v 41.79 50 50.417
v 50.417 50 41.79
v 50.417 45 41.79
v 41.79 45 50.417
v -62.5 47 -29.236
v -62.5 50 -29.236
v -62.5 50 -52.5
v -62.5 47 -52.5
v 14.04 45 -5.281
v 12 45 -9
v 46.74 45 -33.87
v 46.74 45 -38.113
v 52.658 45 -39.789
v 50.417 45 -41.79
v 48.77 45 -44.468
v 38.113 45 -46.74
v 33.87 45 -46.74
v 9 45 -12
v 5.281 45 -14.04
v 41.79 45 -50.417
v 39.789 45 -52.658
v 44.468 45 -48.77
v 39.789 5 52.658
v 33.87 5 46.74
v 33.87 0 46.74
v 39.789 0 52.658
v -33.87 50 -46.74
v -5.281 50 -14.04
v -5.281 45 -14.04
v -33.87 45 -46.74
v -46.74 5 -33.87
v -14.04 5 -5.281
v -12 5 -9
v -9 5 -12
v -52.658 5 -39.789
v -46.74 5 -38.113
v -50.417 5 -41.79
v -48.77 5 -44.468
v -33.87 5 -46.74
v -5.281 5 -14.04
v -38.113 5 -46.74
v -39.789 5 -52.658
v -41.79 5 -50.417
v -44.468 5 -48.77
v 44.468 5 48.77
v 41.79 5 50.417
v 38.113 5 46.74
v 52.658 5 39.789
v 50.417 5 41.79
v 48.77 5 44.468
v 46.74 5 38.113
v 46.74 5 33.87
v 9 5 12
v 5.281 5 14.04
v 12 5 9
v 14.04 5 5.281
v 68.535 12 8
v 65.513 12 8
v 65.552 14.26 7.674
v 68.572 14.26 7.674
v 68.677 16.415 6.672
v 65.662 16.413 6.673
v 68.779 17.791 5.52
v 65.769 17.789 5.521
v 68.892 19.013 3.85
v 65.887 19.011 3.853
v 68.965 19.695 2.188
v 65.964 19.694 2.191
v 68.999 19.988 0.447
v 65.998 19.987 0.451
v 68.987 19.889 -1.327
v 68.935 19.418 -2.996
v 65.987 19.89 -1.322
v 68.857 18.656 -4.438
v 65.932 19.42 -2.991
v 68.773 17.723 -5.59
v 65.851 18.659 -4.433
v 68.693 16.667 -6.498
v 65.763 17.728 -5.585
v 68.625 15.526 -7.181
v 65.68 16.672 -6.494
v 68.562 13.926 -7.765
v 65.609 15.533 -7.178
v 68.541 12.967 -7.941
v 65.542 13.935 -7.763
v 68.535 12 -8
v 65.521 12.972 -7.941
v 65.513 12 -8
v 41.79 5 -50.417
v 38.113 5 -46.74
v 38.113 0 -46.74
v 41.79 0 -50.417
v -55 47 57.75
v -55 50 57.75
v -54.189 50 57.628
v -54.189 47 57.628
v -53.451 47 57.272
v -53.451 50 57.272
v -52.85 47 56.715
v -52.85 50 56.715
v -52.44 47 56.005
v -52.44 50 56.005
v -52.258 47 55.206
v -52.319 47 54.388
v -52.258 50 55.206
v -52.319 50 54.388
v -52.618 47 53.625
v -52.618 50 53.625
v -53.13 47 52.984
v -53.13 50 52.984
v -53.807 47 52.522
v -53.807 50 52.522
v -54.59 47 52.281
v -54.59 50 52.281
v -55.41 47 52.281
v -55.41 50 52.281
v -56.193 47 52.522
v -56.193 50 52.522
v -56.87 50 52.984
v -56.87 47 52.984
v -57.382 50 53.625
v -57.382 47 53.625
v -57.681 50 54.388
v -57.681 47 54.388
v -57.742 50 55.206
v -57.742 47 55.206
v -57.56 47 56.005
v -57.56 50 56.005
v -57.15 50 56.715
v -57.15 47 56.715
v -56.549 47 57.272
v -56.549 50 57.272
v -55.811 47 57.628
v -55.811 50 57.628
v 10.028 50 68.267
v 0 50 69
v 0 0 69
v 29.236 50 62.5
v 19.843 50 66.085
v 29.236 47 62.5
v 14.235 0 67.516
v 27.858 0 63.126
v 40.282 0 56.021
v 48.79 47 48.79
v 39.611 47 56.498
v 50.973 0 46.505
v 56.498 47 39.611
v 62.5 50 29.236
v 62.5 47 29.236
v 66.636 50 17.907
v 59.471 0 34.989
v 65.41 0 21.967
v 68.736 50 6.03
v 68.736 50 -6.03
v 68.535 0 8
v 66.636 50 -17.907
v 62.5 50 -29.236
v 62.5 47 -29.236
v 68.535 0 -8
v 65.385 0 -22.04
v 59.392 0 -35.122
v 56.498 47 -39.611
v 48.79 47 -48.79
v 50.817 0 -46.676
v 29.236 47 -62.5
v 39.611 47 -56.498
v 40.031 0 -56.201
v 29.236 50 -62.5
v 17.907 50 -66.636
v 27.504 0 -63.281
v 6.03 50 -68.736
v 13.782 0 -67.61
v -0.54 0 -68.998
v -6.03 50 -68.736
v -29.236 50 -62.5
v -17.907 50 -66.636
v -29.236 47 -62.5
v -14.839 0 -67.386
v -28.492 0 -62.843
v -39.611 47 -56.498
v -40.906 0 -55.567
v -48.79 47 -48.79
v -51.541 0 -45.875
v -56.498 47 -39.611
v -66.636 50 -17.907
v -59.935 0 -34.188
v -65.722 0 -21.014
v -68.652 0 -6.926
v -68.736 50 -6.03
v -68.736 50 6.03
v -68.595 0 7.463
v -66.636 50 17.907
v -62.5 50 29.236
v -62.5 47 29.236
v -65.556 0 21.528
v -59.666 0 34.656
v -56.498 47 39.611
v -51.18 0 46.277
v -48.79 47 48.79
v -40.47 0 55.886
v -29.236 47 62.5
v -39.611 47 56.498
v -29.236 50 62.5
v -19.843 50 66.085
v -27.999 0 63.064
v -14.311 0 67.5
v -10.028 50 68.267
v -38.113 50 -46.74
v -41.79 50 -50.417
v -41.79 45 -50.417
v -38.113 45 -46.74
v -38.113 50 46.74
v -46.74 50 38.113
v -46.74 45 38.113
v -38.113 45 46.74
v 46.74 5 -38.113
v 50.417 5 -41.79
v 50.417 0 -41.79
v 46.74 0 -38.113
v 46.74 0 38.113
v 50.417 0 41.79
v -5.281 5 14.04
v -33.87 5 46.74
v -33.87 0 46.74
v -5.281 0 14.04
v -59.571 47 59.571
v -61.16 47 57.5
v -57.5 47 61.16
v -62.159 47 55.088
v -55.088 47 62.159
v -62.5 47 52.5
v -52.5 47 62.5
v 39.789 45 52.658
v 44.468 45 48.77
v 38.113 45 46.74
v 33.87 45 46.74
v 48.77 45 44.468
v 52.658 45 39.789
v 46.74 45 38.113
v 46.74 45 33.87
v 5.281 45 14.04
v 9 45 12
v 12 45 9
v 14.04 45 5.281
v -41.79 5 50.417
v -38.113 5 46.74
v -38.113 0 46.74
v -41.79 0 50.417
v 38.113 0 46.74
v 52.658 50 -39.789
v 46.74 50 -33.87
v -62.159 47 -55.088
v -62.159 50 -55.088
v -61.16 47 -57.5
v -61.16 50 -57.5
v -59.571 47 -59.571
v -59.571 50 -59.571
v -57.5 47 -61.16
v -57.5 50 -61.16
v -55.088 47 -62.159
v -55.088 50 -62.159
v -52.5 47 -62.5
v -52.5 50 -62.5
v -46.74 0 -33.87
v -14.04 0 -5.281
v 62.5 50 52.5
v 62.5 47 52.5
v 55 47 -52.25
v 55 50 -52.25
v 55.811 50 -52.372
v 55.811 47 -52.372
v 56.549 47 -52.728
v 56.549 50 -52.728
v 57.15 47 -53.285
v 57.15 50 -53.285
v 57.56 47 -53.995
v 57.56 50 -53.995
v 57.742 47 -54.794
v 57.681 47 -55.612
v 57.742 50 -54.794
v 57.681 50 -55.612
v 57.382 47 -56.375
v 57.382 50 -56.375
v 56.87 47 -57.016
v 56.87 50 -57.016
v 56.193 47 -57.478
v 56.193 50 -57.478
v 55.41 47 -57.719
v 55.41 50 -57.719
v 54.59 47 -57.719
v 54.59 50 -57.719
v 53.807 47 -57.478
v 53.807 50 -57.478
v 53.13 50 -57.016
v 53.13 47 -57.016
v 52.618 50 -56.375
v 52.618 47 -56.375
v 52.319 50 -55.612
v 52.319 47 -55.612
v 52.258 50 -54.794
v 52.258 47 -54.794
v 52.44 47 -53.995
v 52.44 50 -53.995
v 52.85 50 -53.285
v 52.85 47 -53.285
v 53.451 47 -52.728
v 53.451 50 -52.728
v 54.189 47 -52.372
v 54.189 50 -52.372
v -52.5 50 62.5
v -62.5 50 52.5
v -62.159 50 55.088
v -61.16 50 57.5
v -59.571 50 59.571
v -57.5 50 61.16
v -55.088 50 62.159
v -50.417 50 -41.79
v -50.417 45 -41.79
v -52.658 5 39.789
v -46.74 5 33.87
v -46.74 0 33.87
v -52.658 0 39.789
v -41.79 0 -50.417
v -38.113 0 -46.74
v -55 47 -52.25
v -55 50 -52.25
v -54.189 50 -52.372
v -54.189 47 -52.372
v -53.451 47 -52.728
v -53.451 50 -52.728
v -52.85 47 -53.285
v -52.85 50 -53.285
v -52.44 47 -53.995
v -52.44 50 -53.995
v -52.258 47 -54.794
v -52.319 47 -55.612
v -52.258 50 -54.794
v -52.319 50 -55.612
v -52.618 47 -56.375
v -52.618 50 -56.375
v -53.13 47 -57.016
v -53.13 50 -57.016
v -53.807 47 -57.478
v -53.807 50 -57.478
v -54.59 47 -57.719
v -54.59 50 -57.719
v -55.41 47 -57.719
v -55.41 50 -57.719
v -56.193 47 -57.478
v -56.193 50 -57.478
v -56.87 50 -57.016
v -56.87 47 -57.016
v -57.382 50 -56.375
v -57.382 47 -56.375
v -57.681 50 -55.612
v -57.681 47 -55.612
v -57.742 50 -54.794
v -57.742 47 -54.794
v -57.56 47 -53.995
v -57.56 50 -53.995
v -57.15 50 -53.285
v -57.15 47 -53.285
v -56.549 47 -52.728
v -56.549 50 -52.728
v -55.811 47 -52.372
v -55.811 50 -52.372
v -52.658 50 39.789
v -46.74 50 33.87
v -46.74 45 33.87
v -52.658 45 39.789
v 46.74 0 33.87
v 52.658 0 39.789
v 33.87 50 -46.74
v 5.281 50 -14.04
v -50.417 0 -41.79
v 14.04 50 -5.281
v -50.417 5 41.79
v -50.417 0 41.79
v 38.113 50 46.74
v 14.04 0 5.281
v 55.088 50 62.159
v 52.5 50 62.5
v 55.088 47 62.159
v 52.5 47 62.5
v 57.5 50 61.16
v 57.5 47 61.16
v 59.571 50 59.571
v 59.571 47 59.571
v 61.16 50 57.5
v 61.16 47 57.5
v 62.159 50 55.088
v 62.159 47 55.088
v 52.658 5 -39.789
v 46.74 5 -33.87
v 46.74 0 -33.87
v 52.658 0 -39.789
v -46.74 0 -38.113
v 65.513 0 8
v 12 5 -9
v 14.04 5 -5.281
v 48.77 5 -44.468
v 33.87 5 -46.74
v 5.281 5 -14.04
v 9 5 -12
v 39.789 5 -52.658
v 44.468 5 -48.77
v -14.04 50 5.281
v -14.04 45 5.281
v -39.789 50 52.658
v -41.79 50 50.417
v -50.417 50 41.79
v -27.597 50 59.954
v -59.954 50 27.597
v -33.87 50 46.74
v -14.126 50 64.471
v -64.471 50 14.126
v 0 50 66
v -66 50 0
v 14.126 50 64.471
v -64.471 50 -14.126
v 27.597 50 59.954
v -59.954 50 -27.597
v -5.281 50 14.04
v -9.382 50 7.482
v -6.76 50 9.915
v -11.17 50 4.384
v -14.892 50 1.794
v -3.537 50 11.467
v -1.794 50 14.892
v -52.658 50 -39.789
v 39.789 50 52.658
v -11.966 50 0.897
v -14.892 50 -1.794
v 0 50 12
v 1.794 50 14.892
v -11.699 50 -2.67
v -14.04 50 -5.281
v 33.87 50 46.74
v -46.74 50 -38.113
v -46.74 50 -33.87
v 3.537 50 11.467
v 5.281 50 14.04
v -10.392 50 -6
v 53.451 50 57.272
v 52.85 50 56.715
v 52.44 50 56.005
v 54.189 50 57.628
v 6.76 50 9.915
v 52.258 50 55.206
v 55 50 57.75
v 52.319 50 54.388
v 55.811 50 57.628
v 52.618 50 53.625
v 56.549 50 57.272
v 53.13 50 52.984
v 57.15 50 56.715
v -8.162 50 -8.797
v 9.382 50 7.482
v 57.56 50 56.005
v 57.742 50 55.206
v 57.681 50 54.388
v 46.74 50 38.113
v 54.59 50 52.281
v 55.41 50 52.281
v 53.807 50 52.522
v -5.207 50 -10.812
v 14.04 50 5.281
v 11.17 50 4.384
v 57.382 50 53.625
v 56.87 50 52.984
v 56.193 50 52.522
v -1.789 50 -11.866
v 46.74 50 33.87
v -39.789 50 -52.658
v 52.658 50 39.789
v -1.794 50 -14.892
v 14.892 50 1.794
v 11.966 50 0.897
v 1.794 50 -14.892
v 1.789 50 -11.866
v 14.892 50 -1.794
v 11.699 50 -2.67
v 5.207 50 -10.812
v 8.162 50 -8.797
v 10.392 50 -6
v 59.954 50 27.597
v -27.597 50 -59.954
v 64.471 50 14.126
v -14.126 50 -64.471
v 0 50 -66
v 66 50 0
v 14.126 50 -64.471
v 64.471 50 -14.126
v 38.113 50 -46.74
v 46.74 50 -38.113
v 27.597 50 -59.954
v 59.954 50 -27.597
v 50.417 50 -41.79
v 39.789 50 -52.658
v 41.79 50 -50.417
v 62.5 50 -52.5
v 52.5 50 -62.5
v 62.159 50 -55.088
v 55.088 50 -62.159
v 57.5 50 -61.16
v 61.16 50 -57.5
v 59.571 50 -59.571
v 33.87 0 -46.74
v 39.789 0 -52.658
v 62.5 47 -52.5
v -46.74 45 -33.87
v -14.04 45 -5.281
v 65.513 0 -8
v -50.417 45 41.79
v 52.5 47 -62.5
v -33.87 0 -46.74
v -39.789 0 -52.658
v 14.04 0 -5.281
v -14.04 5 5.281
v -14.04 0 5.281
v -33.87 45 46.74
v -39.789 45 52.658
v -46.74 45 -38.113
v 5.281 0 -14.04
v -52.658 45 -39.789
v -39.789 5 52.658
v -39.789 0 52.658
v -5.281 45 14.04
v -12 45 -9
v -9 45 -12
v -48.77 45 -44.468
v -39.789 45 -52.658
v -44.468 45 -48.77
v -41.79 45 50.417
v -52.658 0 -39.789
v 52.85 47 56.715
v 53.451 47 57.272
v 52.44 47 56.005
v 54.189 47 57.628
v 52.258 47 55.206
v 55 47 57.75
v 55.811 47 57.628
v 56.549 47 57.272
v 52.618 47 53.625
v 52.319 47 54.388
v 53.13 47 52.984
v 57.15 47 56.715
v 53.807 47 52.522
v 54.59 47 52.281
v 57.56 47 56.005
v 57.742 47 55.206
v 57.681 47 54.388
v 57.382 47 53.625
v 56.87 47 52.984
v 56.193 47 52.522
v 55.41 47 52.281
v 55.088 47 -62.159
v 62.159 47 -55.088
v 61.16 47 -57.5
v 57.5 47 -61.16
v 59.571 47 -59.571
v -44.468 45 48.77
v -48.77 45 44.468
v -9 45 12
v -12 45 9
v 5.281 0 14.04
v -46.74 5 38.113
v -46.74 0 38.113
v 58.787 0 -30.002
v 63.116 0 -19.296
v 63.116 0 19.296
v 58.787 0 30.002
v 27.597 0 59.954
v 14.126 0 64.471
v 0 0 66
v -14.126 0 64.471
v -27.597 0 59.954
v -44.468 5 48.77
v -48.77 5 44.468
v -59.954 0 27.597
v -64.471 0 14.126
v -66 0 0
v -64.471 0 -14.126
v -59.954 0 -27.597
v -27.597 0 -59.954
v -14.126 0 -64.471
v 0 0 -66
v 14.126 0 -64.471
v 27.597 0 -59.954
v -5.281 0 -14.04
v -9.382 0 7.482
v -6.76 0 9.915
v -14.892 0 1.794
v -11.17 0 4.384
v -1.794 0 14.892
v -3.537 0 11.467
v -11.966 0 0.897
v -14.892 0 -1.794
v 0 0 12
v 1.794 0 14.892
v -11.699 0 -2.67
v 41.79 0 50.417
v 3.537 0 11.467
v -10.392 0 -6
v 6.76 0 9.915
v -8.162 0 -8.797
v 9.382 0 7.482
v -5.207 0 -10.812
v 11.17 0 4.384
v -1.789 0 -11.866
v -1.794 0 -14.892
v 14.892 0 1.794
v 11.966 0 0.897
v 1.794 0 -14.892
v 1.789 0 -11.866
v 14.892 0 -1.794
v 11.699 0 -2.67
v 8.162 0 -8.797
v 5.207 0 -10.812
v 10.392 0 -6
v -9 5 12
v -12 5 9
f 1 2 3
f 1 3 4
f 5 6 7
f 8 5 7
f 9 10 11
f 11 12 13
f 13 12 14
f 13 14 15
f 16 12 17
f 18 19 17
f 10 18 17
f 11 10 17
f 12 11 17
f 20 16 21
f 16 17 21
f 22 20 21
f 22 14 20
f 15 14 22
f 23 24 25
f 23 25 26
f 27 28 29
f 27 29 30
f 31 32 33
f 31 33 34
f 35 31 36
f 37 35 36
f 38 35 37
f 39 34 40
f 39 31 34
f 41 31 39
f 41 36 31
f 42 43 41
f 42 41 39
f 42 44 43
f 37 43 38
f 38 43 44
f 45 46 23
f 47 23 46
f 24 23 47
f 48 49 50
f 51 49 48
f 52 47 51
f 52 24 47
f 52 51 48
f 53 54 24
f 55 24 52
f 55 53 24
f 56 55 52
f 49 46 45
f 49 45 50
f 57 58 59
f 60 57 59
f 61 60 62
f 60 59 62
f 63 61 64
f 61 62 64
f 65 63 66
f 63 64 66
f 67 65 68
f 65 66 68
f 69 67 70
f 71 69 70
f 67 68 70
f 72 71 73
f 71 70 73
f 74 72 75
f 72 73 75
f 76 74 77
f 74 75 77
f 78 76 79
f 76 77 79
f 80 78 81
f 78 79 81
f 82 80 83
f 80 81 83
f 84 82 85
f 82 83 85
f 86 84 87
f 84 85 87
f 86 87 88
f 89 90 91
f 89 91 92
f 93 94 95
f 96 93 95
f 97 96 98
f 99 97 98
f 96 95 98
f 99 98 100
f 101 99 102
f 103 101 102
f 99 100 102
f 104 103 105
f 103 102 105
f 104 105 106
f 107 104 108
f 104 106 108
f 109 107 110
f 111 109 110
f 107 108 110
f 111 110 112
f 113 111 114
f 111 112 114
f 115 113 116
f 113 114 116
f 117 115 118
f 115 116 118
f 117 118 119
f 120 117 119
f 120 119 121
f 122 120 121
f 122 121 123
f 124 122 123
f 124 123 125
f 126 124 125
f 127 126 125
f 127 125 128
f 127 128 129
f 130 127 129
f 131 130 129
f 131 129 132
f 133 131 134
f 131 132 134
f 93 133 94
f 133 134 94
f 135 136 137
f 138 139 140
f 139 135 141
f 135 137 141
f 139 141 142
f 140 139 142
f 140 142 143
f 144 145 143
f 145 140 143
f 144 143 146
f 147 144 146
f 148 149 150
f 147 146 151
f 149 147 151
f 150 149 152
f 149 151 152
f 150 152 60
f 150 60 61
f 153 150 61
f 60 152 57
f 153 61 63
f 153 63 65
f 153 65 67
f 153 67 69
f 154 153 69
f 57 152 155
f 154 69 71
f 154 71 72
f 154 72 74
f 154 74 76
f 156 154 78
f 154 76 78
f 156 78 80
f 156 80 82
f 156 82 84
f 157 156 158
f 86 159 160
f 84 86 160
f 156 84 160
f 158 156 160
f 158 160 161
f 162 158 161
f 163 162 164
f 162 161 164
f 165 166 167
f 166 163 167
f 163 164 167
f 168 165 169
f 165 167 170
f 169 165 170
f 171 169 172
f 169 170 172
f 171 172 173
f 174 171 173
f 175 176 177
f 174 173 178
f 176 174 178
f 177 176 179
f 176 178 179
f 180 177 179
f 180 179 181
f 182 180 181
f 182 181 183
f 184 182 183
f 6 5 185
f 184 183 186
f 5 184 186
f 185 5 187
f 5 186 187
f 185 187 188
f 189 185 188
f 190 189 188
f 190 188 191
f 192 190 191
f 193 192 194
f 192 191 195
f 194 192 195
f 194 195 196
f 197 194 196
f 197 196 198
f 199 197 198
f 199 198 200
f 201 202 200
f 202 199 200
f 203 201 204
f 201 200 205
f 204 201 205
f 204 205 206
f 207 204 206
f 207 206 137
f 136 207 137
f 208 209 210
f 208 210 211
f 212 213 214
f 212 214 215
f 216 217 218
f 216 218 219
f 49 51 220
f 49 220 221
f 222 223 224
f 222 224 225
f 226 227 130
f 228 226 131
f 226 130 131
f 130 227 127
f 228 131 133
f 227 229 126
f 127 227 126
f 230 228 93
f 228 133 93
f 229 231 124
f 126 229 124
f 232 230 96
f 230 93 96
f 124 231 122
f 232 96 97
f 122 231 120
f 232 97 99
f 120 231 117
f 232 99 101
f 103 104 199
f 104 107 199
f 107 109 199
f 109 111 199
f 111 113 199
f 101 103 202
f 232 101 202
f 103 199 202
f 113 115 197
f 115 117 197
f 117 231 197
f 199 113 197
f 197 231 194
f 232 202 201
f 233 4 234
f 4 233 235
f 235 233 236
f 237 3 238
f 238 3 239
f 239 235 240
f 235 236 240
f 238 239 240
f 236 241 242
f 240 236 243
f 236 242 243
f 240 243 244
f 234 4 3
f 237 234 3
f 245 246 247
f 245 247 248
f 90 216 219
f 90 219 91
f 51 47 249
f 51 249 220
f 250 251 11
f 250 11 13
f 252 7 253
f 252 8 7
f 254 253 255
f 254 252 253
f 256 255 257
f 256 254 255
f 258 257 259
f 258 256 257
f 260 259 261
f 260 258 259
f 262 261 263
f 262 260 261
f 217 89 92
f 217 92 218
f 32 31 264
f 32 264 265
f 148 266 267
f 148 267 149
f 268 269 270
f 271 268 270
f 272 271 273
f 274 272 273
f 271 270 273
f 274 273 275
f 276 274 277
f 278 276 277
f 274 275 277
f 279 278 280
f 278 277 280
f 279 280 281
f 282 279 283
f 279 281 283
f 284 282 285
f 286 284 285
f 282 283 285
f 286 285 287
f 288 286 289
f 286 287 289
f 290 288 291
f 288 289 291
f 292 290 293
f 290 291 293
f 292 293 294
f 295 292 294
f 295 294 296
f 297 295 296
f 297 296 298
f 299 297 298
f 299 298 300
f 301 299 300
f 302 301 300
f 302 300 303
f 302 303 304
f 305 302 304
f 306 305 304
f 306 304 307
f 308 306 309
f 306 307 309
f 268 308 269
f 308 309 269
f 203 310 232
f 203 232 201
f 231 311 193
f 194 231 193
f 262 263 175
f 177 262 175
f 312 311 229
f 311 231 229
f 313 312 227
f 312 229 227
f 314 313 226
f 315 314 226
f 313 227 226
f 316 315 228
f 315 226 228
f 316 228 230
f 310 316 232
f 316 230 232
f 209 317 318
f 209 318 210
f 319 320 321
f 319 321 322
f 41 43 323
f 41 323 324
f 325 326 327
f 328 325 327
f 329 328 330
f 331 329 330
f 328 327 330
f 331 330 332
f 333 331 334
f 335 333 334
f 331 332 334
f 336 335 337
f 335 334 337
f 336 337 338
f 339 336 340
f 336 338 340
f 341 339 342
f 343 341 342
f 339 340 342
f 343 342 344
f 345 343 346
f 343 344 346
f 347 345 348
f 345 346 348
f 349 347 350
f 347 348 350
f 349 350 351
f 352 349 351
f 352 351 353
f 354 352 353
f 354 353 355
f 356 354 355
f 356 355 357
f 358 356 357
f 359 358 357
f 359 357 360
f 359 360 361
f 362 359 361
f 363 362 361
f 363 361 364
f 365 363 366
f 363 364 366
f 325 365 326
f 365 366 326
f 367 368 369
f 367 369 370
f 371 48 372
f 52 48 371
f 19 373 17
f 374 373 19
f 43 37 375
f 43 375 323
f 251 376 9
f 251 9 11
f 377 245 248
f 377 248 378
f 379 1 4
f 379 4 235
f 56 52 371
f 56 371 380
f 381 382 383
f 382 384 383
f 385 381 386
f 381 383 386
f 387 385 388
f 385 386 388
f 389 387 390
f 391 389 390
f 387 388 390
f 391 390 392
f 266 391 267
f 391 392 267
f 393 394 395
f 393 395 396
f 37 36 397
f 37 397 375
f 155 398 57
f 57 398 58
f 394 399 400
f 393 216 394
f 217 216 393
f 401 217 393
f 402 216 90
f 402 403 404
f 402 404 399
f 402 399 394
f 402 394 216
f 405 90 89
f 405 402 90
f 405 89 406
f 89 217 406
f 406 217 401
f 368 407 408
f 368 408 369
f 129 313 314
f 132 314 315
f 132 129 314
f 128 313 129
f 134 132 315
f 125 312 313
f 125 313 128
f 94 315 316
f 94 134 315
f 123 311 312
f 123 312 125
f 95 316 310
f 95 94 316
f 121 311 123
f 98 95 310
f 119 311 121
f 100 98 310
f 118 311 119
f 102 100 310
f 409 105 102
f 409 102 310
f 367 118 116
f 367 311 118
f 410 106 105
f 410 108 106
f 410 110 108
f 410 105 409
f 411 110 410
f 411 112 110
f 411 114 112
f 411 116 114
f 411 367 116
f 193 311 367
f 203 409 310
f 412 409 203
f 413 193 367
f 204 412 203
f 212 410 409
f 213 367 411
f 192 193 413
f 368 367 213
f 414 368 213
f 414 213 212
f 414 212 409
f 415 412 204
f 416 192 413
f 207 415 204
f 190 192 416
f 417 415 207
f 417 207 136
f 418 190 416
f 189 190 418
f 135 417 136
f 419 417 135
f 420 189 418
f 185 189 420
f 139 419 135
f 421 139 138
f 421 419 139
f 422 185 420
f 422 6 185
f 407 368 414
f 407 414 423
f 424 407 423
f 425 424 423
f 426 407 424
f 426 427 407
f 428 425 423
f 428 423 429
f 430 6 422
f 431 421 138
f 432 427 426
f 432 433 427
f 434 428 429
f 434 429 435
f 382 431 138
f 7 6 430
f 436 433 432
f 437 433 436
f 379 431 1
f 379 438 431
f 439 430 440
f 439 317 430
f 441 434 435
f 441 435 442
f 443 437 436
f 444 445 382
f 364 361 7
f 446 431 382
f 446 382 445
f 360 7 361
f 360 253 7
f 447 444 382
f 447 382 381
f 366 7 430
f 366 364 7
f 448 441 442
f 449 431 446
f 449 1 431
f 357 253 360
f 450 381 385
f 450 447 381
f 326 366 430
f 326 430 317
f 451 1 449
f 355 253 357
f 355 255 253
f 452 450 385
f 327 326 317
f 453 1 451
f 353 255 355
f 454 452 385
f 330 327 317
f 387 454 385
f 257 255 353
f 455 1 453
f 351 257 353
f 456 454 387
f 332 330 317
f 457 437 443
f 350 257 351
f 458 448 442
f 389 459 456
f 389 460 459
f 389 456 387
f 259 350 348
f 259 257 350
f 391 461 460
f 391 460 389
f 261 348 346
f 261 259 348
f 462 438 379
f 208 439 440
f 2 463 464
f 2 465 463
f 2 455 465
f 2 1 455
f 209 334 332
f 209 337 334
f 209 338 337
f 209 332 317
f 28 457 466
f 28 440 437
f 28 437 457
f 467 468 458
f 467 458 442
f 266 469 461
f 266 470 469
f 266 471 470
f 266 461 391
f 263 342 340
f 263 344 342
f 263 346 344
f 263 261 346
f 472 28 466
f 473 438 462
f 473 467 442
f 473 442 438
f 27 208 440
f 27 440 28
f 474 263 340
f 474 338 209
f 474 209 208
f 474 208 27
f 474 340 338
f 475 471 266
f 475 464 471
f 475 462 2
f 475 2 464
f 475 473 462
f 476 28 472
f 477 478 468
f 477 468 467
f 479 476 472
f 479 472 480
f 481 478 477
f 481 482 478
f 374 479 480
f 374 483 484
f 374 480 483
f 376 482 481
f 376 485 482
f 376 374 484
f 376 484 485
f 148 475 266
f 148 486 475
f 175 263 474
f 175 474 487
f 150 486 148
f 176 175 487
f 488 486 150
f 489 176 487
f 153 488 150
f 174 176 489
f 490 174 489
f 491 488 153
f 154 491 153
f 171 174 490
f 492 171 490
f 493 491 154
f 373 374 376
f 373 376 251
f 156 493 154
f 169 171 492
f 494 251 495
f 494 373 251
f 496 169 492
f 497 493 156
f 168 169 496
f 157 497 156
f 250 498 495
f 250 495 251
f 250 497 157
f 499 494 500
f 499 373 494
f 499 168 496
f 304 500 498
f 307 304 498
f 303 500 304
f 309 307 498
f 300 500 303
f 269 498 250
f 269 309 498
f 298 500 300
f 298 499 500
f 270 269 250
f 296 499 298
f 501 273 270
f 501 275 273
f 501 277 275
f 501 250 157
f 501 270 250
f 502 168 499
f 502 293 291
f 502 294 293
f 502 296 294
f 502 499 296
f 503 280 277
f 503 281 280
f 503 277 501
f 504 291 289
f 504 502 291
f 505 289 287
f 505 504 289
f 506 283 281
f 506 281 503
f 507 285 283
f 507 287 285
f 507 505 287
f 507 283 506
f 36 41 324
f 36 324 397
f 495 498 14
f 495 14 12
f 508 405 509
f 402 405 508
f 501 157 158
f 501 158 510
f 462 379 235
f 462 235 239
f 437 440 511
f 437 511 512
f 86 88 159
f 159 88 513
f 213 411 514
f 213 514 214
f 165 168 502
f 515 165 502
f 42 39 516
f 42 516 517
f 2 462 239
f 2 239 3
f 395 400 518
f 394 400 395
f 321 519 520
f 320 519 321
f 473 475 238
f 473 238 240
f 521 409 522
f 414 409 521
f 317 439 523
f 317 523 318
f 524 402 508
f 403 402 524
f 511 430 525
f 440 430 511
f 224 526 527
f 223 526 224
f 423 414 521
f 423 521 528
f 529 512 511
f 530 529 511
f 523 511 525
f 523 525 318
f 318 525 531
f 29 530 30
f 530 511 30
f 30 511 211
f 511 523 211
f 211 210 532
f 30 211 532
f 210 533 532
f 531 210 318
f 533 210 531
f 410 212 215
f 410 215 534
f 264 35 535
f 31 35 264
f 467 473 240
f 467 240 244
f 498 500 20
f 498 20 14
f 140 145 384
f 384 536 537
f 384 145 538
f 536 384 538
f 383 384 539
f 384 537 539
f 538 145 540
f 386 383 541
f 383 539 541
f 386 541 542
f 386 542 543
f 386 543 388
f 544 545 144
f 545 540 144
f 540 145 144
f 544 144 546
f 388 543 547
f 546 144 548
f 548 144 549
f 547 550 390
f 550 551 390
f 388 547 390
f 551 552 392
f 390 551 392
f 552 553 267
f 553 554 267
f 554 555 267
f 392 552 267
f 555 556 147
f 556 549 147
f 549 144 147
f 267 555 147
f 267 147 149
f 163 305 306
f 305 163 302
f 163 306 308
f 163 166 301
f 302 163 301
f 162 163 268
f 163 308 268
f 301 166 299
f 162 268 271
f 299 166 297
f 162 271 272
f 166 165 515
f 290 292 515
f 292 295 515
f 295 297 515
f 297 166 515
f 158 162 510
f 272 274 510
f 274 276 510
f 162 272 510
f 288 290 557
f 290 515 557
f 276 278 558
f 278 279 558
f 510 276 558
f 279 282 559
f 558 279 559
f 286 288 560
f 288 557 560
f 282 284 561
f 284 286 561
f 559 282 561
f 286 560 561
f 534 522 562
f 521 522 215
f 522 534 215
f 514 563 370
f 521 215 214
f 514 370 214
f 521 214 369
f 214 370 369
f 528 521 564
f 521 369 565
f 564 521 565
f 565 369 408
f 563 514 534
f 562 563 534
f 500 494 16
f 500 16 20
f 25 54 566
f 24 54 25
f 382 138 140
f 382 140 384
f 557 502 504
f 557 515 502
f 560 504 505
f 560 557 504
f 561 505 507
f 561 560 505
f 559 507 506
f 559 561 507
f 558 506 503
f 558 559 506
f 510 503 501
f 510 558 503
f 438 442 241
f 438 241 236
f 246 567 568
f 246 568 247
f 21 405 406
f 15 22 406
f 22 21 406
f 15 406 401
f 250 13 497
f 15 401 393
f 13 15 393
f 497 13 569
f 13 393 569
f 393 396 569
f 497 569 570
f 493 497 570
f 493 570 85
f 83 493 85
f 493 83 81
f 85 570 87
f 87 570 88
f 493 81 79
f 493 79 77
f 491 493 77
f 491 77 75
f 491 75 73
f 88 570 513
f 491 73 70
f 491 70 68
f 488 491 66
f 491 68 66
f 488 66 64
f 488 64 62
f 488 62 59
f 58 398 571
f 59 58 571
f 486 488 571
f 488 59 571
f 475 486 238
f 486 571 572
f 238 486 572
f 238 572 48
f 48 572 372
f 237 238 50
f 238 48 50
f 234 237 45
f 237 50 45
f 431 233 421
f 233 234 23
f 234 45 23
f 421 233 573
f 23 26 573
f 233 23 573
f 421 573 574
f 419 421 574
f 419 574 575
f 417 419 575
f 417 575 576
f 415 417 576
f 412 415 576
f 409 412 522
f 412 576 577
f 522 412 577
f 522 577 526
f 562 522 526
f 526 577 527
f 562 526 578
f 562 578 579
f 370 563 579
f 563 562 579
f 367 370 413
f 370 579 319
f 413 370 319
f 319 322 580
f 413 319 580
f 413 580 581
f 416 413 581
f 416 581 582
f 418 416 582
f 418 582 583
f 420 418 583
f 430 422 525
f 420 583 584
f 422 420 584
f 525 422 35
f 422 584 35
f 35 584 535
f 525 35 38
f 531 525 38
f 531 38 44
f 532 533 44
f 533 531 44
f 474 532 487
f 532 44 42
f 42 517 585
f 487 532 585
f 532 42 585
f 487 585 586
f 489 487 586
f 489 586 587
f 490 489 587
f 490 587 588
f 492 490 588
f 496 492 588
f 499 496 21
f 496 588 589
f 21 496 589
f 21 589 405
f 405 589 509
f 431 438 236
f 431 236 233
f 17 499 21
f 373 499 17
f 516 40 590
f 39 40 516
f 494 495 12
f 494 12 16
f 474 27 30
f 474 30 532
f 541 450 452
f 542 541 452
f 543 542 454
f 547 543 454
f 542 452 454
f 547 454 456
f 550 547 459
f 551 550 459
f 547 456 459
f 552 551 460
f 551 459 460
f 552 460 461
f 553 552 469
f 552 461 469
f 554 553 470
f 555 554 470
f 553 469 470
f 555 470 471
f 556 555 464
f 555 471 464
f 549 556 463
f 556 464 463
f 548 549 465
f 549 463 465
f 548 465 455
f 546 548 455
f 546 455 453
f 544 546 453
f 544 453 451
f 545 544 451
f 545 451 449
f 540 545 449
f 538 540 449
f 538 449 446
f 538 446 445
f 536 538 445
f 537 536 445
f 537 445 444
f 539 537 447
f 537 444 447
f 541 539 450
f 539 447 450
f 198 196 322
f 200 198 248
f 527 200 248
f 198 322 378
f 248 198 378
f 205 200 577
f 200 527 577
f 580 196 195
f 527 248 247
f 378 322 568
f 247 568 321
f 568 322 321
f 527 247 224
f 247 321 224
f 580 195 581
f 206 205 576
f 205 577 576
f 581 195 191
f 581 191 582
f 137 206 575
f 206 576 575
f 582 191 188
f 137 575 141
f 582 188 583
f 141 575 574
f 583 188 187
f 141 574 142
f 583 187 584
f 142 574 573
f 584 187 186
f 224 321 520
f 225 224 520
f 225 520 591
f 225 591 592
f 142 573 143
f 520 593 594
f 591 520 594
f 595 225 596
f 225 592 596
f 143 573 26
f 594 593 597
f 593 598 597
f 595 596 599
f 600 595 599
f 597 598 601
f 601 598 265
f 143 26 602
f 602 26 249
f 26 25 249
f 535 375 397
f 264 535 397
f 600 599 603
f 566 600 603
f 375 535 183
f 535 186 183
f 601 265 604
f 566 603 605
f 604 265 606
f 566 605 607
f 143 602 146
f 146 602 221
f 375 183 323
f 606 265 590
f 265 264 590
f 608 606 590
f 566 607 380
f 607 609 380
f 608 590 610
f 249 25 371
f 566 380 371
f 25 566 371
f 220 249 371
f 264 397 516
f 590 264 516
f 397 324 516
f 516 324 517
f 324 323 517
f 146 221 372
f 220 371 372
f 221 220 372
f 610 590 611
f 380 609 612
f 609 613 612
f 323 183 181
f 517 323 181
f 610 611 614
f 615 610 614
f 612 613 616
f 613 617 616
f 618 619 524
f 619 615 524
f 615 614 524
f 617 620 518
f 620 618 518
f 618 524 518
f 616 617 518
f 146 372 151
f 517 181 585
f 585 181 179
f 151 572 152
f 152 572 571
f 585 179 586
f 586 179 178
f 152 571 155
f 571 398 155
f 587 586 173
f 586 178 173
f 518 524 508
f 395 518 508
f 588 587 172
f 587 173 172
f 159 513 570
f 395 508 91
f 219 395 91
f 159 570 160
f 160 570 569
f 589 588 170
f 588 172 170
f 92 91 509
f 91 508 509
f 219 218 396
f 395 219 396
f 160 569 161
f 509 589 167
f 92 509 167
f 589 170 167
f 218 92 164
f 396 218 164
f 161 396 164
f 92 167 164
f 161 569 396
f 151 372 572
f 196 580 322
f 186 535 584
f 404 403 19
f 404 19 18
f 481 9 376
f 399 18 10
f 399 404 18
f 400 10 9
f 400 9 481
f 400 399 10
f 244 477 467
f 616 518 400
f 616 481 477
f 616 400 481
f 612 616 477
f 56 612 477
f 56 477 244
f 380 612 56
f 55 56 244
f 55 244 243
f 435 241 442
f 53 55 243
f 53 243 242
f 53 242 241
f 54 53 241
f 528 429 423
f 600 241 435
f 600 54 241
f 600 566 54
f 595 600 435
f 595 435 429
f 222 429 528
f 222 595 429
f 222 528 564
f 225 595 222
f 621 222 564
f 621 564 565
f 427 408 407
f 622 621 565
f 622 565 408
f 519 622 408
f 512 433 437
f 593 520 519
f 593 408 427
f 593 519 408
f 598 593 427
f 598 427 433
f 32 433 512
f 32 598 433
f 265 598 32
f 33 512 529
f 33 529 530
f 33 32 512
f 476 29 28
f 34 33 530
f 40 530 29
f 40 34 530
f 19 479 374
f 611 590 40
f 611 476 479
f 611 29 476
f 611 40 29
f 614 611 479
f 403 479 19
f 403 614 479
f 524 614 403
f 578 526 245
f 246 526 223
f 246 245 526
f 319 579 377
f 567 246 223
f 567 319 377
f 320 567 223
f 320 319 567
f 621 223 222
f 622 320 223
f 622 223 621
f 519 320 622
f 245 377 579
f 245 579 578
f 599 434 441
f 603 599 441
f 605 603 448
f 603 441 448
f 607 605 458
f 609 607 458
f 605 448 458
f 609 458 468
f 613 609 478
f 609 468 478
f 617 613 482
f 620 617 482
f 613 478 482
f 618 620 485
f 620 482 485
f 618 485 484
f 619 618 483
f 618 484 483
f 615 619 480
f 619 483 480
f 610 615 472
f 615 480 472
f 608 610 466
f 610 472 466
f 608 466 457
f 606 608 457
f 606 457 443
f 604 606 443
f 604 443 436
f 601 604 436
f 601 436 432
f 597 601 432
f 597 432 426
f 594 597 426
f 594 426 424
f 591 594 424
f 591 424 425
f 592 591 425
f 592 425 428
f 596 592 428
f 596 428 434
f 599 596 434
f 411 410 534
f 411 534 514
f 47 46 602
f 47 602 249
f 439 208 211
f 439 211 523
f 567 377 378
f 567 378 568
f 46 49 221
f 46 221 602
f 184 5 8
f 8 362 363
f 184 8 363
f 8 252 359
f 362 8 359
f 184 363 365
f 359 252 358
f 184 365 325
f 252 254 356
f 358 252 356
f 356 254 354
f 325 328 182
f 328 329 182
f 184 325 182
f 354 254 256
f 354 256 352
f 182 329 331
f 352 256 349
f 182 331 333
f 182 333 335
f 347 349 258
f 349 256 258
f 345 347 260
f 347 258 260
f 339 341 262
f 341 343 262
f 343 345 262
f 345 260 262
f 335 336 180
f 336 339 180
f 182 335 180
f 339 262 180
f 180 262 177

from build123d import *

# Parameters (mm, degrees)
SKETCH1_R               = 69
BOSS_EXTRUDE1_DEPTH     = 50
SKETCH2_W               = 125
SKETCH2_H               = 125
BOSS_EXTRUDE2_DEPTH     = 3
SKETCH3_R               = 2.75
CUT_EXTRUDE1_DEPTH      = 3
SKETCH4_R               = 66
CUT_EXTRUDE2_DEPTH      = 110.644881321
FILLET1_R               = 10
CUT_EXTRUDE3_DEPTH      = 110.644881321
BOSS_EXTRUDE4_DEPTH     = 50
CIRPATTERN2_COUNT       = 4
BOSS_EXTRUDE5_DEPTH     = 50
CUT_EXTRUDE4_DEPTH      = 20
CUT_EXTRUDE4_DEPTH_BACK = 20
SKETCH10_R              = 66
SKETCH11_R              = 15
BOSS_EXTRUDE6_DEPTH     = 50
SKETCH14_R              = 12
CUT_EXTRUDE6_DEPTH      = 110.644881494


with BuildPart() as part:
    # Sketch1 → Boss-Extrude1 (new body)
    with BuildSketch(Plane(origin=(0, 0, 0), x_dir=(1, 0, 0), z_dir=(0, 1, 0))):
        with Locations(Location((0, 0, 0), (0, 0, 270))):
            Circle(SKETCH1_R)
    extrude(amount=BOSS_EXTRUDE1_DEPTH)

    # Sketch2 → Boss-Extrude2 (add)
    with BuildSketch(Plane(origin=(0, 50, 0), x_dir=(1, 0, 0), z_dir=(0, 1, 0))):
        Rectangle(SKETCH2_W, SKETCH2_H)
    extrude(amount=-BOSS_EXTRUDE2_DEPTH)

    # Sketch3 → Cut-Extrude1 (cut)
    with BuildSketch(Plane(origin=(0, 50, 0), x_dir=(1, 0, 0), z_dir=(0, 1, 0))):
        with Locations(Location((55, 55, 0), (0, 0, 270))):
            Circle(SKETCH3_R)
        with Locations(Location((-55, 55, 0), (0, 0, 270))):
            Circle(SKETCH3_R)
        with Locations(Location((-55, -55, 0), (0, 0, 270))):
            Circle(SKETCH3_R)
        with Locations(Location((55, -55, 0), (0, 0, 270))):
            Circle(SKETCH3_R)
    extrude(amount=-CUT_EXTRUDE1_DEPTH, mode=Mode.SUBTRACT)

    # Sketch4 → Cut-Extrude2 (cut, through all)
    with BuildSketch(Plane.XZ):
        with Locations(Location((0, 0, 0), (0, 0, 270))):
            Circle(SKETCH4_R)
    extrude(amount=-CUT_EXTRUDE2_DEPTH, mode=Mode.SUBTRACT)

    # Fillet1
    fillet1_edges = [part.edges().sort_by_distance(p)[0] for p in [
        (-62.5, 48.5, 62.5),
        (-62.5, 48.5, -62.5),
        (62.5, 48.5, -62.5),
        (62.5, 48.5, 62.5),
    ]]
    fillet(fillet1_edges, radius=FILLET1_R)

    # Sketch6 → Cut-Extrude3 (cut, through all)
    with BuildSketch(Plane(origin=(0, 0, 0), x_dir=(0, 0, -1), z_dir=(1, 0, 0))):
        with BuildLine():
            Line((-8, 0), (-8, 12))
            ThreePointArc((-8, 12), (0, 20), (8, 12))
            Line((8, 12), (8, 0))
            ThreePointArc((8, 0), (0, -8), (-8, 0))
        make_face()
    extrude(amount=CUT_EXTRUDE3_DEPTH, mode=Mode.SUBTRACT)

    # Sketch8 → Boss-Extrude4 (add)
    with BuildSketch(Plane(origin=(0, 50, 0), x_dir=(1, 0, 0), z_dir=(0, 1, 0))):
        Polygon((41.790010768, 54.659354186), (33.870414819, 46.739758236), (46.739758236, 33.870414819), (54.659354186, 41.790010768), align=None)
        Polygon((41.790010768, 50.416713499), (50.416713499, 41.790010768), (46.739758236, 38.113055506), (38.113055506, 46.739758236), align=None, mode=Mode.SUBTRACT)
    boss_extrude4 = extrude(amount=-BOSS_EXTRUDE4_DEPTH)

    # CirPattern2: Boss-Extrude4 ×4 about axis
    cirpattern2_axis = Axis((0, 0, 0), (0, 1, 0))
    for i in range(1, CIRPATTERN2_COUNT):
        add(boss_extrude4.rotate(cirpattern2_axis, i * 360 / CIRPATTERN2_COUNT))

    # Sketch9 → Boss-Extrude5 (add)
    with BuildSketch(Plane(origin=(0, 50, 0), x_dir=(1, 0, 0), z_dir=(0, 1, 0))):
        Polygon((46.739758236, 33.870414819), (33.870414819, 46.739758236), (0, 8), (-33.870414819, 46.739758236), (-46.739758236, 33.870414819), (-8, 0), (-46.739758236, -33.870414819), (-33.870414819, -46.739758236), (0, -8), (33.870414819, -46.739758236), (46.739758236, -33.870414819), (8, 0), align=None)
    extrude(amount=-BOSS_EXTRUDE5_DEPTH)

    # Sketch10 → Cut-Extrude4 (cut, two sides: drawn at the far end of the back side and taken through both)
    with BuildSketch(Plane(origin=(0, 25, 0), x_dir=(1, 0, 0), z_dir=(0, 1, 0)).offset(-CUT_EXTRUDE4_DEPTH_BACK)):
        with Locations(Location((0, 0, 0), (0, 0, 52.925119379))):
            Circle(SKETCH10_R)
    extrude(amount=CUT_EXTRUDE4_DEPTH + CUT_EXTRUDE4_DEPTH_BACK, mode=Mode.SUBTRACT)

    # Sketch11 → Boss-Extrude6 (add)
    with BuildSketch(Plane.XZ):
        with Locations(Location((0, 0, 0), (0, 0, 290.612180744))):
            Circle(SKETCH11_R)
    extrude(amount=-BOSS_EXTRUDE6_DEPTH)

    # Sketch14 → Cut-Extrude6 (cut, through all)
    with BuildSketch(Plane(origin=(0, 50, 0), x_dir=(1, 0, 0), z_dir=(0, 1, 0))):
        with Locations(Location((0, 0, 0), (0, 0, 270))):
            Circle(SKETCH14_R)
    extrude(amount=-CUT_EXTRUDE6_DEPTH, mode=Mode.SUBTRACT)


solid = part.part
